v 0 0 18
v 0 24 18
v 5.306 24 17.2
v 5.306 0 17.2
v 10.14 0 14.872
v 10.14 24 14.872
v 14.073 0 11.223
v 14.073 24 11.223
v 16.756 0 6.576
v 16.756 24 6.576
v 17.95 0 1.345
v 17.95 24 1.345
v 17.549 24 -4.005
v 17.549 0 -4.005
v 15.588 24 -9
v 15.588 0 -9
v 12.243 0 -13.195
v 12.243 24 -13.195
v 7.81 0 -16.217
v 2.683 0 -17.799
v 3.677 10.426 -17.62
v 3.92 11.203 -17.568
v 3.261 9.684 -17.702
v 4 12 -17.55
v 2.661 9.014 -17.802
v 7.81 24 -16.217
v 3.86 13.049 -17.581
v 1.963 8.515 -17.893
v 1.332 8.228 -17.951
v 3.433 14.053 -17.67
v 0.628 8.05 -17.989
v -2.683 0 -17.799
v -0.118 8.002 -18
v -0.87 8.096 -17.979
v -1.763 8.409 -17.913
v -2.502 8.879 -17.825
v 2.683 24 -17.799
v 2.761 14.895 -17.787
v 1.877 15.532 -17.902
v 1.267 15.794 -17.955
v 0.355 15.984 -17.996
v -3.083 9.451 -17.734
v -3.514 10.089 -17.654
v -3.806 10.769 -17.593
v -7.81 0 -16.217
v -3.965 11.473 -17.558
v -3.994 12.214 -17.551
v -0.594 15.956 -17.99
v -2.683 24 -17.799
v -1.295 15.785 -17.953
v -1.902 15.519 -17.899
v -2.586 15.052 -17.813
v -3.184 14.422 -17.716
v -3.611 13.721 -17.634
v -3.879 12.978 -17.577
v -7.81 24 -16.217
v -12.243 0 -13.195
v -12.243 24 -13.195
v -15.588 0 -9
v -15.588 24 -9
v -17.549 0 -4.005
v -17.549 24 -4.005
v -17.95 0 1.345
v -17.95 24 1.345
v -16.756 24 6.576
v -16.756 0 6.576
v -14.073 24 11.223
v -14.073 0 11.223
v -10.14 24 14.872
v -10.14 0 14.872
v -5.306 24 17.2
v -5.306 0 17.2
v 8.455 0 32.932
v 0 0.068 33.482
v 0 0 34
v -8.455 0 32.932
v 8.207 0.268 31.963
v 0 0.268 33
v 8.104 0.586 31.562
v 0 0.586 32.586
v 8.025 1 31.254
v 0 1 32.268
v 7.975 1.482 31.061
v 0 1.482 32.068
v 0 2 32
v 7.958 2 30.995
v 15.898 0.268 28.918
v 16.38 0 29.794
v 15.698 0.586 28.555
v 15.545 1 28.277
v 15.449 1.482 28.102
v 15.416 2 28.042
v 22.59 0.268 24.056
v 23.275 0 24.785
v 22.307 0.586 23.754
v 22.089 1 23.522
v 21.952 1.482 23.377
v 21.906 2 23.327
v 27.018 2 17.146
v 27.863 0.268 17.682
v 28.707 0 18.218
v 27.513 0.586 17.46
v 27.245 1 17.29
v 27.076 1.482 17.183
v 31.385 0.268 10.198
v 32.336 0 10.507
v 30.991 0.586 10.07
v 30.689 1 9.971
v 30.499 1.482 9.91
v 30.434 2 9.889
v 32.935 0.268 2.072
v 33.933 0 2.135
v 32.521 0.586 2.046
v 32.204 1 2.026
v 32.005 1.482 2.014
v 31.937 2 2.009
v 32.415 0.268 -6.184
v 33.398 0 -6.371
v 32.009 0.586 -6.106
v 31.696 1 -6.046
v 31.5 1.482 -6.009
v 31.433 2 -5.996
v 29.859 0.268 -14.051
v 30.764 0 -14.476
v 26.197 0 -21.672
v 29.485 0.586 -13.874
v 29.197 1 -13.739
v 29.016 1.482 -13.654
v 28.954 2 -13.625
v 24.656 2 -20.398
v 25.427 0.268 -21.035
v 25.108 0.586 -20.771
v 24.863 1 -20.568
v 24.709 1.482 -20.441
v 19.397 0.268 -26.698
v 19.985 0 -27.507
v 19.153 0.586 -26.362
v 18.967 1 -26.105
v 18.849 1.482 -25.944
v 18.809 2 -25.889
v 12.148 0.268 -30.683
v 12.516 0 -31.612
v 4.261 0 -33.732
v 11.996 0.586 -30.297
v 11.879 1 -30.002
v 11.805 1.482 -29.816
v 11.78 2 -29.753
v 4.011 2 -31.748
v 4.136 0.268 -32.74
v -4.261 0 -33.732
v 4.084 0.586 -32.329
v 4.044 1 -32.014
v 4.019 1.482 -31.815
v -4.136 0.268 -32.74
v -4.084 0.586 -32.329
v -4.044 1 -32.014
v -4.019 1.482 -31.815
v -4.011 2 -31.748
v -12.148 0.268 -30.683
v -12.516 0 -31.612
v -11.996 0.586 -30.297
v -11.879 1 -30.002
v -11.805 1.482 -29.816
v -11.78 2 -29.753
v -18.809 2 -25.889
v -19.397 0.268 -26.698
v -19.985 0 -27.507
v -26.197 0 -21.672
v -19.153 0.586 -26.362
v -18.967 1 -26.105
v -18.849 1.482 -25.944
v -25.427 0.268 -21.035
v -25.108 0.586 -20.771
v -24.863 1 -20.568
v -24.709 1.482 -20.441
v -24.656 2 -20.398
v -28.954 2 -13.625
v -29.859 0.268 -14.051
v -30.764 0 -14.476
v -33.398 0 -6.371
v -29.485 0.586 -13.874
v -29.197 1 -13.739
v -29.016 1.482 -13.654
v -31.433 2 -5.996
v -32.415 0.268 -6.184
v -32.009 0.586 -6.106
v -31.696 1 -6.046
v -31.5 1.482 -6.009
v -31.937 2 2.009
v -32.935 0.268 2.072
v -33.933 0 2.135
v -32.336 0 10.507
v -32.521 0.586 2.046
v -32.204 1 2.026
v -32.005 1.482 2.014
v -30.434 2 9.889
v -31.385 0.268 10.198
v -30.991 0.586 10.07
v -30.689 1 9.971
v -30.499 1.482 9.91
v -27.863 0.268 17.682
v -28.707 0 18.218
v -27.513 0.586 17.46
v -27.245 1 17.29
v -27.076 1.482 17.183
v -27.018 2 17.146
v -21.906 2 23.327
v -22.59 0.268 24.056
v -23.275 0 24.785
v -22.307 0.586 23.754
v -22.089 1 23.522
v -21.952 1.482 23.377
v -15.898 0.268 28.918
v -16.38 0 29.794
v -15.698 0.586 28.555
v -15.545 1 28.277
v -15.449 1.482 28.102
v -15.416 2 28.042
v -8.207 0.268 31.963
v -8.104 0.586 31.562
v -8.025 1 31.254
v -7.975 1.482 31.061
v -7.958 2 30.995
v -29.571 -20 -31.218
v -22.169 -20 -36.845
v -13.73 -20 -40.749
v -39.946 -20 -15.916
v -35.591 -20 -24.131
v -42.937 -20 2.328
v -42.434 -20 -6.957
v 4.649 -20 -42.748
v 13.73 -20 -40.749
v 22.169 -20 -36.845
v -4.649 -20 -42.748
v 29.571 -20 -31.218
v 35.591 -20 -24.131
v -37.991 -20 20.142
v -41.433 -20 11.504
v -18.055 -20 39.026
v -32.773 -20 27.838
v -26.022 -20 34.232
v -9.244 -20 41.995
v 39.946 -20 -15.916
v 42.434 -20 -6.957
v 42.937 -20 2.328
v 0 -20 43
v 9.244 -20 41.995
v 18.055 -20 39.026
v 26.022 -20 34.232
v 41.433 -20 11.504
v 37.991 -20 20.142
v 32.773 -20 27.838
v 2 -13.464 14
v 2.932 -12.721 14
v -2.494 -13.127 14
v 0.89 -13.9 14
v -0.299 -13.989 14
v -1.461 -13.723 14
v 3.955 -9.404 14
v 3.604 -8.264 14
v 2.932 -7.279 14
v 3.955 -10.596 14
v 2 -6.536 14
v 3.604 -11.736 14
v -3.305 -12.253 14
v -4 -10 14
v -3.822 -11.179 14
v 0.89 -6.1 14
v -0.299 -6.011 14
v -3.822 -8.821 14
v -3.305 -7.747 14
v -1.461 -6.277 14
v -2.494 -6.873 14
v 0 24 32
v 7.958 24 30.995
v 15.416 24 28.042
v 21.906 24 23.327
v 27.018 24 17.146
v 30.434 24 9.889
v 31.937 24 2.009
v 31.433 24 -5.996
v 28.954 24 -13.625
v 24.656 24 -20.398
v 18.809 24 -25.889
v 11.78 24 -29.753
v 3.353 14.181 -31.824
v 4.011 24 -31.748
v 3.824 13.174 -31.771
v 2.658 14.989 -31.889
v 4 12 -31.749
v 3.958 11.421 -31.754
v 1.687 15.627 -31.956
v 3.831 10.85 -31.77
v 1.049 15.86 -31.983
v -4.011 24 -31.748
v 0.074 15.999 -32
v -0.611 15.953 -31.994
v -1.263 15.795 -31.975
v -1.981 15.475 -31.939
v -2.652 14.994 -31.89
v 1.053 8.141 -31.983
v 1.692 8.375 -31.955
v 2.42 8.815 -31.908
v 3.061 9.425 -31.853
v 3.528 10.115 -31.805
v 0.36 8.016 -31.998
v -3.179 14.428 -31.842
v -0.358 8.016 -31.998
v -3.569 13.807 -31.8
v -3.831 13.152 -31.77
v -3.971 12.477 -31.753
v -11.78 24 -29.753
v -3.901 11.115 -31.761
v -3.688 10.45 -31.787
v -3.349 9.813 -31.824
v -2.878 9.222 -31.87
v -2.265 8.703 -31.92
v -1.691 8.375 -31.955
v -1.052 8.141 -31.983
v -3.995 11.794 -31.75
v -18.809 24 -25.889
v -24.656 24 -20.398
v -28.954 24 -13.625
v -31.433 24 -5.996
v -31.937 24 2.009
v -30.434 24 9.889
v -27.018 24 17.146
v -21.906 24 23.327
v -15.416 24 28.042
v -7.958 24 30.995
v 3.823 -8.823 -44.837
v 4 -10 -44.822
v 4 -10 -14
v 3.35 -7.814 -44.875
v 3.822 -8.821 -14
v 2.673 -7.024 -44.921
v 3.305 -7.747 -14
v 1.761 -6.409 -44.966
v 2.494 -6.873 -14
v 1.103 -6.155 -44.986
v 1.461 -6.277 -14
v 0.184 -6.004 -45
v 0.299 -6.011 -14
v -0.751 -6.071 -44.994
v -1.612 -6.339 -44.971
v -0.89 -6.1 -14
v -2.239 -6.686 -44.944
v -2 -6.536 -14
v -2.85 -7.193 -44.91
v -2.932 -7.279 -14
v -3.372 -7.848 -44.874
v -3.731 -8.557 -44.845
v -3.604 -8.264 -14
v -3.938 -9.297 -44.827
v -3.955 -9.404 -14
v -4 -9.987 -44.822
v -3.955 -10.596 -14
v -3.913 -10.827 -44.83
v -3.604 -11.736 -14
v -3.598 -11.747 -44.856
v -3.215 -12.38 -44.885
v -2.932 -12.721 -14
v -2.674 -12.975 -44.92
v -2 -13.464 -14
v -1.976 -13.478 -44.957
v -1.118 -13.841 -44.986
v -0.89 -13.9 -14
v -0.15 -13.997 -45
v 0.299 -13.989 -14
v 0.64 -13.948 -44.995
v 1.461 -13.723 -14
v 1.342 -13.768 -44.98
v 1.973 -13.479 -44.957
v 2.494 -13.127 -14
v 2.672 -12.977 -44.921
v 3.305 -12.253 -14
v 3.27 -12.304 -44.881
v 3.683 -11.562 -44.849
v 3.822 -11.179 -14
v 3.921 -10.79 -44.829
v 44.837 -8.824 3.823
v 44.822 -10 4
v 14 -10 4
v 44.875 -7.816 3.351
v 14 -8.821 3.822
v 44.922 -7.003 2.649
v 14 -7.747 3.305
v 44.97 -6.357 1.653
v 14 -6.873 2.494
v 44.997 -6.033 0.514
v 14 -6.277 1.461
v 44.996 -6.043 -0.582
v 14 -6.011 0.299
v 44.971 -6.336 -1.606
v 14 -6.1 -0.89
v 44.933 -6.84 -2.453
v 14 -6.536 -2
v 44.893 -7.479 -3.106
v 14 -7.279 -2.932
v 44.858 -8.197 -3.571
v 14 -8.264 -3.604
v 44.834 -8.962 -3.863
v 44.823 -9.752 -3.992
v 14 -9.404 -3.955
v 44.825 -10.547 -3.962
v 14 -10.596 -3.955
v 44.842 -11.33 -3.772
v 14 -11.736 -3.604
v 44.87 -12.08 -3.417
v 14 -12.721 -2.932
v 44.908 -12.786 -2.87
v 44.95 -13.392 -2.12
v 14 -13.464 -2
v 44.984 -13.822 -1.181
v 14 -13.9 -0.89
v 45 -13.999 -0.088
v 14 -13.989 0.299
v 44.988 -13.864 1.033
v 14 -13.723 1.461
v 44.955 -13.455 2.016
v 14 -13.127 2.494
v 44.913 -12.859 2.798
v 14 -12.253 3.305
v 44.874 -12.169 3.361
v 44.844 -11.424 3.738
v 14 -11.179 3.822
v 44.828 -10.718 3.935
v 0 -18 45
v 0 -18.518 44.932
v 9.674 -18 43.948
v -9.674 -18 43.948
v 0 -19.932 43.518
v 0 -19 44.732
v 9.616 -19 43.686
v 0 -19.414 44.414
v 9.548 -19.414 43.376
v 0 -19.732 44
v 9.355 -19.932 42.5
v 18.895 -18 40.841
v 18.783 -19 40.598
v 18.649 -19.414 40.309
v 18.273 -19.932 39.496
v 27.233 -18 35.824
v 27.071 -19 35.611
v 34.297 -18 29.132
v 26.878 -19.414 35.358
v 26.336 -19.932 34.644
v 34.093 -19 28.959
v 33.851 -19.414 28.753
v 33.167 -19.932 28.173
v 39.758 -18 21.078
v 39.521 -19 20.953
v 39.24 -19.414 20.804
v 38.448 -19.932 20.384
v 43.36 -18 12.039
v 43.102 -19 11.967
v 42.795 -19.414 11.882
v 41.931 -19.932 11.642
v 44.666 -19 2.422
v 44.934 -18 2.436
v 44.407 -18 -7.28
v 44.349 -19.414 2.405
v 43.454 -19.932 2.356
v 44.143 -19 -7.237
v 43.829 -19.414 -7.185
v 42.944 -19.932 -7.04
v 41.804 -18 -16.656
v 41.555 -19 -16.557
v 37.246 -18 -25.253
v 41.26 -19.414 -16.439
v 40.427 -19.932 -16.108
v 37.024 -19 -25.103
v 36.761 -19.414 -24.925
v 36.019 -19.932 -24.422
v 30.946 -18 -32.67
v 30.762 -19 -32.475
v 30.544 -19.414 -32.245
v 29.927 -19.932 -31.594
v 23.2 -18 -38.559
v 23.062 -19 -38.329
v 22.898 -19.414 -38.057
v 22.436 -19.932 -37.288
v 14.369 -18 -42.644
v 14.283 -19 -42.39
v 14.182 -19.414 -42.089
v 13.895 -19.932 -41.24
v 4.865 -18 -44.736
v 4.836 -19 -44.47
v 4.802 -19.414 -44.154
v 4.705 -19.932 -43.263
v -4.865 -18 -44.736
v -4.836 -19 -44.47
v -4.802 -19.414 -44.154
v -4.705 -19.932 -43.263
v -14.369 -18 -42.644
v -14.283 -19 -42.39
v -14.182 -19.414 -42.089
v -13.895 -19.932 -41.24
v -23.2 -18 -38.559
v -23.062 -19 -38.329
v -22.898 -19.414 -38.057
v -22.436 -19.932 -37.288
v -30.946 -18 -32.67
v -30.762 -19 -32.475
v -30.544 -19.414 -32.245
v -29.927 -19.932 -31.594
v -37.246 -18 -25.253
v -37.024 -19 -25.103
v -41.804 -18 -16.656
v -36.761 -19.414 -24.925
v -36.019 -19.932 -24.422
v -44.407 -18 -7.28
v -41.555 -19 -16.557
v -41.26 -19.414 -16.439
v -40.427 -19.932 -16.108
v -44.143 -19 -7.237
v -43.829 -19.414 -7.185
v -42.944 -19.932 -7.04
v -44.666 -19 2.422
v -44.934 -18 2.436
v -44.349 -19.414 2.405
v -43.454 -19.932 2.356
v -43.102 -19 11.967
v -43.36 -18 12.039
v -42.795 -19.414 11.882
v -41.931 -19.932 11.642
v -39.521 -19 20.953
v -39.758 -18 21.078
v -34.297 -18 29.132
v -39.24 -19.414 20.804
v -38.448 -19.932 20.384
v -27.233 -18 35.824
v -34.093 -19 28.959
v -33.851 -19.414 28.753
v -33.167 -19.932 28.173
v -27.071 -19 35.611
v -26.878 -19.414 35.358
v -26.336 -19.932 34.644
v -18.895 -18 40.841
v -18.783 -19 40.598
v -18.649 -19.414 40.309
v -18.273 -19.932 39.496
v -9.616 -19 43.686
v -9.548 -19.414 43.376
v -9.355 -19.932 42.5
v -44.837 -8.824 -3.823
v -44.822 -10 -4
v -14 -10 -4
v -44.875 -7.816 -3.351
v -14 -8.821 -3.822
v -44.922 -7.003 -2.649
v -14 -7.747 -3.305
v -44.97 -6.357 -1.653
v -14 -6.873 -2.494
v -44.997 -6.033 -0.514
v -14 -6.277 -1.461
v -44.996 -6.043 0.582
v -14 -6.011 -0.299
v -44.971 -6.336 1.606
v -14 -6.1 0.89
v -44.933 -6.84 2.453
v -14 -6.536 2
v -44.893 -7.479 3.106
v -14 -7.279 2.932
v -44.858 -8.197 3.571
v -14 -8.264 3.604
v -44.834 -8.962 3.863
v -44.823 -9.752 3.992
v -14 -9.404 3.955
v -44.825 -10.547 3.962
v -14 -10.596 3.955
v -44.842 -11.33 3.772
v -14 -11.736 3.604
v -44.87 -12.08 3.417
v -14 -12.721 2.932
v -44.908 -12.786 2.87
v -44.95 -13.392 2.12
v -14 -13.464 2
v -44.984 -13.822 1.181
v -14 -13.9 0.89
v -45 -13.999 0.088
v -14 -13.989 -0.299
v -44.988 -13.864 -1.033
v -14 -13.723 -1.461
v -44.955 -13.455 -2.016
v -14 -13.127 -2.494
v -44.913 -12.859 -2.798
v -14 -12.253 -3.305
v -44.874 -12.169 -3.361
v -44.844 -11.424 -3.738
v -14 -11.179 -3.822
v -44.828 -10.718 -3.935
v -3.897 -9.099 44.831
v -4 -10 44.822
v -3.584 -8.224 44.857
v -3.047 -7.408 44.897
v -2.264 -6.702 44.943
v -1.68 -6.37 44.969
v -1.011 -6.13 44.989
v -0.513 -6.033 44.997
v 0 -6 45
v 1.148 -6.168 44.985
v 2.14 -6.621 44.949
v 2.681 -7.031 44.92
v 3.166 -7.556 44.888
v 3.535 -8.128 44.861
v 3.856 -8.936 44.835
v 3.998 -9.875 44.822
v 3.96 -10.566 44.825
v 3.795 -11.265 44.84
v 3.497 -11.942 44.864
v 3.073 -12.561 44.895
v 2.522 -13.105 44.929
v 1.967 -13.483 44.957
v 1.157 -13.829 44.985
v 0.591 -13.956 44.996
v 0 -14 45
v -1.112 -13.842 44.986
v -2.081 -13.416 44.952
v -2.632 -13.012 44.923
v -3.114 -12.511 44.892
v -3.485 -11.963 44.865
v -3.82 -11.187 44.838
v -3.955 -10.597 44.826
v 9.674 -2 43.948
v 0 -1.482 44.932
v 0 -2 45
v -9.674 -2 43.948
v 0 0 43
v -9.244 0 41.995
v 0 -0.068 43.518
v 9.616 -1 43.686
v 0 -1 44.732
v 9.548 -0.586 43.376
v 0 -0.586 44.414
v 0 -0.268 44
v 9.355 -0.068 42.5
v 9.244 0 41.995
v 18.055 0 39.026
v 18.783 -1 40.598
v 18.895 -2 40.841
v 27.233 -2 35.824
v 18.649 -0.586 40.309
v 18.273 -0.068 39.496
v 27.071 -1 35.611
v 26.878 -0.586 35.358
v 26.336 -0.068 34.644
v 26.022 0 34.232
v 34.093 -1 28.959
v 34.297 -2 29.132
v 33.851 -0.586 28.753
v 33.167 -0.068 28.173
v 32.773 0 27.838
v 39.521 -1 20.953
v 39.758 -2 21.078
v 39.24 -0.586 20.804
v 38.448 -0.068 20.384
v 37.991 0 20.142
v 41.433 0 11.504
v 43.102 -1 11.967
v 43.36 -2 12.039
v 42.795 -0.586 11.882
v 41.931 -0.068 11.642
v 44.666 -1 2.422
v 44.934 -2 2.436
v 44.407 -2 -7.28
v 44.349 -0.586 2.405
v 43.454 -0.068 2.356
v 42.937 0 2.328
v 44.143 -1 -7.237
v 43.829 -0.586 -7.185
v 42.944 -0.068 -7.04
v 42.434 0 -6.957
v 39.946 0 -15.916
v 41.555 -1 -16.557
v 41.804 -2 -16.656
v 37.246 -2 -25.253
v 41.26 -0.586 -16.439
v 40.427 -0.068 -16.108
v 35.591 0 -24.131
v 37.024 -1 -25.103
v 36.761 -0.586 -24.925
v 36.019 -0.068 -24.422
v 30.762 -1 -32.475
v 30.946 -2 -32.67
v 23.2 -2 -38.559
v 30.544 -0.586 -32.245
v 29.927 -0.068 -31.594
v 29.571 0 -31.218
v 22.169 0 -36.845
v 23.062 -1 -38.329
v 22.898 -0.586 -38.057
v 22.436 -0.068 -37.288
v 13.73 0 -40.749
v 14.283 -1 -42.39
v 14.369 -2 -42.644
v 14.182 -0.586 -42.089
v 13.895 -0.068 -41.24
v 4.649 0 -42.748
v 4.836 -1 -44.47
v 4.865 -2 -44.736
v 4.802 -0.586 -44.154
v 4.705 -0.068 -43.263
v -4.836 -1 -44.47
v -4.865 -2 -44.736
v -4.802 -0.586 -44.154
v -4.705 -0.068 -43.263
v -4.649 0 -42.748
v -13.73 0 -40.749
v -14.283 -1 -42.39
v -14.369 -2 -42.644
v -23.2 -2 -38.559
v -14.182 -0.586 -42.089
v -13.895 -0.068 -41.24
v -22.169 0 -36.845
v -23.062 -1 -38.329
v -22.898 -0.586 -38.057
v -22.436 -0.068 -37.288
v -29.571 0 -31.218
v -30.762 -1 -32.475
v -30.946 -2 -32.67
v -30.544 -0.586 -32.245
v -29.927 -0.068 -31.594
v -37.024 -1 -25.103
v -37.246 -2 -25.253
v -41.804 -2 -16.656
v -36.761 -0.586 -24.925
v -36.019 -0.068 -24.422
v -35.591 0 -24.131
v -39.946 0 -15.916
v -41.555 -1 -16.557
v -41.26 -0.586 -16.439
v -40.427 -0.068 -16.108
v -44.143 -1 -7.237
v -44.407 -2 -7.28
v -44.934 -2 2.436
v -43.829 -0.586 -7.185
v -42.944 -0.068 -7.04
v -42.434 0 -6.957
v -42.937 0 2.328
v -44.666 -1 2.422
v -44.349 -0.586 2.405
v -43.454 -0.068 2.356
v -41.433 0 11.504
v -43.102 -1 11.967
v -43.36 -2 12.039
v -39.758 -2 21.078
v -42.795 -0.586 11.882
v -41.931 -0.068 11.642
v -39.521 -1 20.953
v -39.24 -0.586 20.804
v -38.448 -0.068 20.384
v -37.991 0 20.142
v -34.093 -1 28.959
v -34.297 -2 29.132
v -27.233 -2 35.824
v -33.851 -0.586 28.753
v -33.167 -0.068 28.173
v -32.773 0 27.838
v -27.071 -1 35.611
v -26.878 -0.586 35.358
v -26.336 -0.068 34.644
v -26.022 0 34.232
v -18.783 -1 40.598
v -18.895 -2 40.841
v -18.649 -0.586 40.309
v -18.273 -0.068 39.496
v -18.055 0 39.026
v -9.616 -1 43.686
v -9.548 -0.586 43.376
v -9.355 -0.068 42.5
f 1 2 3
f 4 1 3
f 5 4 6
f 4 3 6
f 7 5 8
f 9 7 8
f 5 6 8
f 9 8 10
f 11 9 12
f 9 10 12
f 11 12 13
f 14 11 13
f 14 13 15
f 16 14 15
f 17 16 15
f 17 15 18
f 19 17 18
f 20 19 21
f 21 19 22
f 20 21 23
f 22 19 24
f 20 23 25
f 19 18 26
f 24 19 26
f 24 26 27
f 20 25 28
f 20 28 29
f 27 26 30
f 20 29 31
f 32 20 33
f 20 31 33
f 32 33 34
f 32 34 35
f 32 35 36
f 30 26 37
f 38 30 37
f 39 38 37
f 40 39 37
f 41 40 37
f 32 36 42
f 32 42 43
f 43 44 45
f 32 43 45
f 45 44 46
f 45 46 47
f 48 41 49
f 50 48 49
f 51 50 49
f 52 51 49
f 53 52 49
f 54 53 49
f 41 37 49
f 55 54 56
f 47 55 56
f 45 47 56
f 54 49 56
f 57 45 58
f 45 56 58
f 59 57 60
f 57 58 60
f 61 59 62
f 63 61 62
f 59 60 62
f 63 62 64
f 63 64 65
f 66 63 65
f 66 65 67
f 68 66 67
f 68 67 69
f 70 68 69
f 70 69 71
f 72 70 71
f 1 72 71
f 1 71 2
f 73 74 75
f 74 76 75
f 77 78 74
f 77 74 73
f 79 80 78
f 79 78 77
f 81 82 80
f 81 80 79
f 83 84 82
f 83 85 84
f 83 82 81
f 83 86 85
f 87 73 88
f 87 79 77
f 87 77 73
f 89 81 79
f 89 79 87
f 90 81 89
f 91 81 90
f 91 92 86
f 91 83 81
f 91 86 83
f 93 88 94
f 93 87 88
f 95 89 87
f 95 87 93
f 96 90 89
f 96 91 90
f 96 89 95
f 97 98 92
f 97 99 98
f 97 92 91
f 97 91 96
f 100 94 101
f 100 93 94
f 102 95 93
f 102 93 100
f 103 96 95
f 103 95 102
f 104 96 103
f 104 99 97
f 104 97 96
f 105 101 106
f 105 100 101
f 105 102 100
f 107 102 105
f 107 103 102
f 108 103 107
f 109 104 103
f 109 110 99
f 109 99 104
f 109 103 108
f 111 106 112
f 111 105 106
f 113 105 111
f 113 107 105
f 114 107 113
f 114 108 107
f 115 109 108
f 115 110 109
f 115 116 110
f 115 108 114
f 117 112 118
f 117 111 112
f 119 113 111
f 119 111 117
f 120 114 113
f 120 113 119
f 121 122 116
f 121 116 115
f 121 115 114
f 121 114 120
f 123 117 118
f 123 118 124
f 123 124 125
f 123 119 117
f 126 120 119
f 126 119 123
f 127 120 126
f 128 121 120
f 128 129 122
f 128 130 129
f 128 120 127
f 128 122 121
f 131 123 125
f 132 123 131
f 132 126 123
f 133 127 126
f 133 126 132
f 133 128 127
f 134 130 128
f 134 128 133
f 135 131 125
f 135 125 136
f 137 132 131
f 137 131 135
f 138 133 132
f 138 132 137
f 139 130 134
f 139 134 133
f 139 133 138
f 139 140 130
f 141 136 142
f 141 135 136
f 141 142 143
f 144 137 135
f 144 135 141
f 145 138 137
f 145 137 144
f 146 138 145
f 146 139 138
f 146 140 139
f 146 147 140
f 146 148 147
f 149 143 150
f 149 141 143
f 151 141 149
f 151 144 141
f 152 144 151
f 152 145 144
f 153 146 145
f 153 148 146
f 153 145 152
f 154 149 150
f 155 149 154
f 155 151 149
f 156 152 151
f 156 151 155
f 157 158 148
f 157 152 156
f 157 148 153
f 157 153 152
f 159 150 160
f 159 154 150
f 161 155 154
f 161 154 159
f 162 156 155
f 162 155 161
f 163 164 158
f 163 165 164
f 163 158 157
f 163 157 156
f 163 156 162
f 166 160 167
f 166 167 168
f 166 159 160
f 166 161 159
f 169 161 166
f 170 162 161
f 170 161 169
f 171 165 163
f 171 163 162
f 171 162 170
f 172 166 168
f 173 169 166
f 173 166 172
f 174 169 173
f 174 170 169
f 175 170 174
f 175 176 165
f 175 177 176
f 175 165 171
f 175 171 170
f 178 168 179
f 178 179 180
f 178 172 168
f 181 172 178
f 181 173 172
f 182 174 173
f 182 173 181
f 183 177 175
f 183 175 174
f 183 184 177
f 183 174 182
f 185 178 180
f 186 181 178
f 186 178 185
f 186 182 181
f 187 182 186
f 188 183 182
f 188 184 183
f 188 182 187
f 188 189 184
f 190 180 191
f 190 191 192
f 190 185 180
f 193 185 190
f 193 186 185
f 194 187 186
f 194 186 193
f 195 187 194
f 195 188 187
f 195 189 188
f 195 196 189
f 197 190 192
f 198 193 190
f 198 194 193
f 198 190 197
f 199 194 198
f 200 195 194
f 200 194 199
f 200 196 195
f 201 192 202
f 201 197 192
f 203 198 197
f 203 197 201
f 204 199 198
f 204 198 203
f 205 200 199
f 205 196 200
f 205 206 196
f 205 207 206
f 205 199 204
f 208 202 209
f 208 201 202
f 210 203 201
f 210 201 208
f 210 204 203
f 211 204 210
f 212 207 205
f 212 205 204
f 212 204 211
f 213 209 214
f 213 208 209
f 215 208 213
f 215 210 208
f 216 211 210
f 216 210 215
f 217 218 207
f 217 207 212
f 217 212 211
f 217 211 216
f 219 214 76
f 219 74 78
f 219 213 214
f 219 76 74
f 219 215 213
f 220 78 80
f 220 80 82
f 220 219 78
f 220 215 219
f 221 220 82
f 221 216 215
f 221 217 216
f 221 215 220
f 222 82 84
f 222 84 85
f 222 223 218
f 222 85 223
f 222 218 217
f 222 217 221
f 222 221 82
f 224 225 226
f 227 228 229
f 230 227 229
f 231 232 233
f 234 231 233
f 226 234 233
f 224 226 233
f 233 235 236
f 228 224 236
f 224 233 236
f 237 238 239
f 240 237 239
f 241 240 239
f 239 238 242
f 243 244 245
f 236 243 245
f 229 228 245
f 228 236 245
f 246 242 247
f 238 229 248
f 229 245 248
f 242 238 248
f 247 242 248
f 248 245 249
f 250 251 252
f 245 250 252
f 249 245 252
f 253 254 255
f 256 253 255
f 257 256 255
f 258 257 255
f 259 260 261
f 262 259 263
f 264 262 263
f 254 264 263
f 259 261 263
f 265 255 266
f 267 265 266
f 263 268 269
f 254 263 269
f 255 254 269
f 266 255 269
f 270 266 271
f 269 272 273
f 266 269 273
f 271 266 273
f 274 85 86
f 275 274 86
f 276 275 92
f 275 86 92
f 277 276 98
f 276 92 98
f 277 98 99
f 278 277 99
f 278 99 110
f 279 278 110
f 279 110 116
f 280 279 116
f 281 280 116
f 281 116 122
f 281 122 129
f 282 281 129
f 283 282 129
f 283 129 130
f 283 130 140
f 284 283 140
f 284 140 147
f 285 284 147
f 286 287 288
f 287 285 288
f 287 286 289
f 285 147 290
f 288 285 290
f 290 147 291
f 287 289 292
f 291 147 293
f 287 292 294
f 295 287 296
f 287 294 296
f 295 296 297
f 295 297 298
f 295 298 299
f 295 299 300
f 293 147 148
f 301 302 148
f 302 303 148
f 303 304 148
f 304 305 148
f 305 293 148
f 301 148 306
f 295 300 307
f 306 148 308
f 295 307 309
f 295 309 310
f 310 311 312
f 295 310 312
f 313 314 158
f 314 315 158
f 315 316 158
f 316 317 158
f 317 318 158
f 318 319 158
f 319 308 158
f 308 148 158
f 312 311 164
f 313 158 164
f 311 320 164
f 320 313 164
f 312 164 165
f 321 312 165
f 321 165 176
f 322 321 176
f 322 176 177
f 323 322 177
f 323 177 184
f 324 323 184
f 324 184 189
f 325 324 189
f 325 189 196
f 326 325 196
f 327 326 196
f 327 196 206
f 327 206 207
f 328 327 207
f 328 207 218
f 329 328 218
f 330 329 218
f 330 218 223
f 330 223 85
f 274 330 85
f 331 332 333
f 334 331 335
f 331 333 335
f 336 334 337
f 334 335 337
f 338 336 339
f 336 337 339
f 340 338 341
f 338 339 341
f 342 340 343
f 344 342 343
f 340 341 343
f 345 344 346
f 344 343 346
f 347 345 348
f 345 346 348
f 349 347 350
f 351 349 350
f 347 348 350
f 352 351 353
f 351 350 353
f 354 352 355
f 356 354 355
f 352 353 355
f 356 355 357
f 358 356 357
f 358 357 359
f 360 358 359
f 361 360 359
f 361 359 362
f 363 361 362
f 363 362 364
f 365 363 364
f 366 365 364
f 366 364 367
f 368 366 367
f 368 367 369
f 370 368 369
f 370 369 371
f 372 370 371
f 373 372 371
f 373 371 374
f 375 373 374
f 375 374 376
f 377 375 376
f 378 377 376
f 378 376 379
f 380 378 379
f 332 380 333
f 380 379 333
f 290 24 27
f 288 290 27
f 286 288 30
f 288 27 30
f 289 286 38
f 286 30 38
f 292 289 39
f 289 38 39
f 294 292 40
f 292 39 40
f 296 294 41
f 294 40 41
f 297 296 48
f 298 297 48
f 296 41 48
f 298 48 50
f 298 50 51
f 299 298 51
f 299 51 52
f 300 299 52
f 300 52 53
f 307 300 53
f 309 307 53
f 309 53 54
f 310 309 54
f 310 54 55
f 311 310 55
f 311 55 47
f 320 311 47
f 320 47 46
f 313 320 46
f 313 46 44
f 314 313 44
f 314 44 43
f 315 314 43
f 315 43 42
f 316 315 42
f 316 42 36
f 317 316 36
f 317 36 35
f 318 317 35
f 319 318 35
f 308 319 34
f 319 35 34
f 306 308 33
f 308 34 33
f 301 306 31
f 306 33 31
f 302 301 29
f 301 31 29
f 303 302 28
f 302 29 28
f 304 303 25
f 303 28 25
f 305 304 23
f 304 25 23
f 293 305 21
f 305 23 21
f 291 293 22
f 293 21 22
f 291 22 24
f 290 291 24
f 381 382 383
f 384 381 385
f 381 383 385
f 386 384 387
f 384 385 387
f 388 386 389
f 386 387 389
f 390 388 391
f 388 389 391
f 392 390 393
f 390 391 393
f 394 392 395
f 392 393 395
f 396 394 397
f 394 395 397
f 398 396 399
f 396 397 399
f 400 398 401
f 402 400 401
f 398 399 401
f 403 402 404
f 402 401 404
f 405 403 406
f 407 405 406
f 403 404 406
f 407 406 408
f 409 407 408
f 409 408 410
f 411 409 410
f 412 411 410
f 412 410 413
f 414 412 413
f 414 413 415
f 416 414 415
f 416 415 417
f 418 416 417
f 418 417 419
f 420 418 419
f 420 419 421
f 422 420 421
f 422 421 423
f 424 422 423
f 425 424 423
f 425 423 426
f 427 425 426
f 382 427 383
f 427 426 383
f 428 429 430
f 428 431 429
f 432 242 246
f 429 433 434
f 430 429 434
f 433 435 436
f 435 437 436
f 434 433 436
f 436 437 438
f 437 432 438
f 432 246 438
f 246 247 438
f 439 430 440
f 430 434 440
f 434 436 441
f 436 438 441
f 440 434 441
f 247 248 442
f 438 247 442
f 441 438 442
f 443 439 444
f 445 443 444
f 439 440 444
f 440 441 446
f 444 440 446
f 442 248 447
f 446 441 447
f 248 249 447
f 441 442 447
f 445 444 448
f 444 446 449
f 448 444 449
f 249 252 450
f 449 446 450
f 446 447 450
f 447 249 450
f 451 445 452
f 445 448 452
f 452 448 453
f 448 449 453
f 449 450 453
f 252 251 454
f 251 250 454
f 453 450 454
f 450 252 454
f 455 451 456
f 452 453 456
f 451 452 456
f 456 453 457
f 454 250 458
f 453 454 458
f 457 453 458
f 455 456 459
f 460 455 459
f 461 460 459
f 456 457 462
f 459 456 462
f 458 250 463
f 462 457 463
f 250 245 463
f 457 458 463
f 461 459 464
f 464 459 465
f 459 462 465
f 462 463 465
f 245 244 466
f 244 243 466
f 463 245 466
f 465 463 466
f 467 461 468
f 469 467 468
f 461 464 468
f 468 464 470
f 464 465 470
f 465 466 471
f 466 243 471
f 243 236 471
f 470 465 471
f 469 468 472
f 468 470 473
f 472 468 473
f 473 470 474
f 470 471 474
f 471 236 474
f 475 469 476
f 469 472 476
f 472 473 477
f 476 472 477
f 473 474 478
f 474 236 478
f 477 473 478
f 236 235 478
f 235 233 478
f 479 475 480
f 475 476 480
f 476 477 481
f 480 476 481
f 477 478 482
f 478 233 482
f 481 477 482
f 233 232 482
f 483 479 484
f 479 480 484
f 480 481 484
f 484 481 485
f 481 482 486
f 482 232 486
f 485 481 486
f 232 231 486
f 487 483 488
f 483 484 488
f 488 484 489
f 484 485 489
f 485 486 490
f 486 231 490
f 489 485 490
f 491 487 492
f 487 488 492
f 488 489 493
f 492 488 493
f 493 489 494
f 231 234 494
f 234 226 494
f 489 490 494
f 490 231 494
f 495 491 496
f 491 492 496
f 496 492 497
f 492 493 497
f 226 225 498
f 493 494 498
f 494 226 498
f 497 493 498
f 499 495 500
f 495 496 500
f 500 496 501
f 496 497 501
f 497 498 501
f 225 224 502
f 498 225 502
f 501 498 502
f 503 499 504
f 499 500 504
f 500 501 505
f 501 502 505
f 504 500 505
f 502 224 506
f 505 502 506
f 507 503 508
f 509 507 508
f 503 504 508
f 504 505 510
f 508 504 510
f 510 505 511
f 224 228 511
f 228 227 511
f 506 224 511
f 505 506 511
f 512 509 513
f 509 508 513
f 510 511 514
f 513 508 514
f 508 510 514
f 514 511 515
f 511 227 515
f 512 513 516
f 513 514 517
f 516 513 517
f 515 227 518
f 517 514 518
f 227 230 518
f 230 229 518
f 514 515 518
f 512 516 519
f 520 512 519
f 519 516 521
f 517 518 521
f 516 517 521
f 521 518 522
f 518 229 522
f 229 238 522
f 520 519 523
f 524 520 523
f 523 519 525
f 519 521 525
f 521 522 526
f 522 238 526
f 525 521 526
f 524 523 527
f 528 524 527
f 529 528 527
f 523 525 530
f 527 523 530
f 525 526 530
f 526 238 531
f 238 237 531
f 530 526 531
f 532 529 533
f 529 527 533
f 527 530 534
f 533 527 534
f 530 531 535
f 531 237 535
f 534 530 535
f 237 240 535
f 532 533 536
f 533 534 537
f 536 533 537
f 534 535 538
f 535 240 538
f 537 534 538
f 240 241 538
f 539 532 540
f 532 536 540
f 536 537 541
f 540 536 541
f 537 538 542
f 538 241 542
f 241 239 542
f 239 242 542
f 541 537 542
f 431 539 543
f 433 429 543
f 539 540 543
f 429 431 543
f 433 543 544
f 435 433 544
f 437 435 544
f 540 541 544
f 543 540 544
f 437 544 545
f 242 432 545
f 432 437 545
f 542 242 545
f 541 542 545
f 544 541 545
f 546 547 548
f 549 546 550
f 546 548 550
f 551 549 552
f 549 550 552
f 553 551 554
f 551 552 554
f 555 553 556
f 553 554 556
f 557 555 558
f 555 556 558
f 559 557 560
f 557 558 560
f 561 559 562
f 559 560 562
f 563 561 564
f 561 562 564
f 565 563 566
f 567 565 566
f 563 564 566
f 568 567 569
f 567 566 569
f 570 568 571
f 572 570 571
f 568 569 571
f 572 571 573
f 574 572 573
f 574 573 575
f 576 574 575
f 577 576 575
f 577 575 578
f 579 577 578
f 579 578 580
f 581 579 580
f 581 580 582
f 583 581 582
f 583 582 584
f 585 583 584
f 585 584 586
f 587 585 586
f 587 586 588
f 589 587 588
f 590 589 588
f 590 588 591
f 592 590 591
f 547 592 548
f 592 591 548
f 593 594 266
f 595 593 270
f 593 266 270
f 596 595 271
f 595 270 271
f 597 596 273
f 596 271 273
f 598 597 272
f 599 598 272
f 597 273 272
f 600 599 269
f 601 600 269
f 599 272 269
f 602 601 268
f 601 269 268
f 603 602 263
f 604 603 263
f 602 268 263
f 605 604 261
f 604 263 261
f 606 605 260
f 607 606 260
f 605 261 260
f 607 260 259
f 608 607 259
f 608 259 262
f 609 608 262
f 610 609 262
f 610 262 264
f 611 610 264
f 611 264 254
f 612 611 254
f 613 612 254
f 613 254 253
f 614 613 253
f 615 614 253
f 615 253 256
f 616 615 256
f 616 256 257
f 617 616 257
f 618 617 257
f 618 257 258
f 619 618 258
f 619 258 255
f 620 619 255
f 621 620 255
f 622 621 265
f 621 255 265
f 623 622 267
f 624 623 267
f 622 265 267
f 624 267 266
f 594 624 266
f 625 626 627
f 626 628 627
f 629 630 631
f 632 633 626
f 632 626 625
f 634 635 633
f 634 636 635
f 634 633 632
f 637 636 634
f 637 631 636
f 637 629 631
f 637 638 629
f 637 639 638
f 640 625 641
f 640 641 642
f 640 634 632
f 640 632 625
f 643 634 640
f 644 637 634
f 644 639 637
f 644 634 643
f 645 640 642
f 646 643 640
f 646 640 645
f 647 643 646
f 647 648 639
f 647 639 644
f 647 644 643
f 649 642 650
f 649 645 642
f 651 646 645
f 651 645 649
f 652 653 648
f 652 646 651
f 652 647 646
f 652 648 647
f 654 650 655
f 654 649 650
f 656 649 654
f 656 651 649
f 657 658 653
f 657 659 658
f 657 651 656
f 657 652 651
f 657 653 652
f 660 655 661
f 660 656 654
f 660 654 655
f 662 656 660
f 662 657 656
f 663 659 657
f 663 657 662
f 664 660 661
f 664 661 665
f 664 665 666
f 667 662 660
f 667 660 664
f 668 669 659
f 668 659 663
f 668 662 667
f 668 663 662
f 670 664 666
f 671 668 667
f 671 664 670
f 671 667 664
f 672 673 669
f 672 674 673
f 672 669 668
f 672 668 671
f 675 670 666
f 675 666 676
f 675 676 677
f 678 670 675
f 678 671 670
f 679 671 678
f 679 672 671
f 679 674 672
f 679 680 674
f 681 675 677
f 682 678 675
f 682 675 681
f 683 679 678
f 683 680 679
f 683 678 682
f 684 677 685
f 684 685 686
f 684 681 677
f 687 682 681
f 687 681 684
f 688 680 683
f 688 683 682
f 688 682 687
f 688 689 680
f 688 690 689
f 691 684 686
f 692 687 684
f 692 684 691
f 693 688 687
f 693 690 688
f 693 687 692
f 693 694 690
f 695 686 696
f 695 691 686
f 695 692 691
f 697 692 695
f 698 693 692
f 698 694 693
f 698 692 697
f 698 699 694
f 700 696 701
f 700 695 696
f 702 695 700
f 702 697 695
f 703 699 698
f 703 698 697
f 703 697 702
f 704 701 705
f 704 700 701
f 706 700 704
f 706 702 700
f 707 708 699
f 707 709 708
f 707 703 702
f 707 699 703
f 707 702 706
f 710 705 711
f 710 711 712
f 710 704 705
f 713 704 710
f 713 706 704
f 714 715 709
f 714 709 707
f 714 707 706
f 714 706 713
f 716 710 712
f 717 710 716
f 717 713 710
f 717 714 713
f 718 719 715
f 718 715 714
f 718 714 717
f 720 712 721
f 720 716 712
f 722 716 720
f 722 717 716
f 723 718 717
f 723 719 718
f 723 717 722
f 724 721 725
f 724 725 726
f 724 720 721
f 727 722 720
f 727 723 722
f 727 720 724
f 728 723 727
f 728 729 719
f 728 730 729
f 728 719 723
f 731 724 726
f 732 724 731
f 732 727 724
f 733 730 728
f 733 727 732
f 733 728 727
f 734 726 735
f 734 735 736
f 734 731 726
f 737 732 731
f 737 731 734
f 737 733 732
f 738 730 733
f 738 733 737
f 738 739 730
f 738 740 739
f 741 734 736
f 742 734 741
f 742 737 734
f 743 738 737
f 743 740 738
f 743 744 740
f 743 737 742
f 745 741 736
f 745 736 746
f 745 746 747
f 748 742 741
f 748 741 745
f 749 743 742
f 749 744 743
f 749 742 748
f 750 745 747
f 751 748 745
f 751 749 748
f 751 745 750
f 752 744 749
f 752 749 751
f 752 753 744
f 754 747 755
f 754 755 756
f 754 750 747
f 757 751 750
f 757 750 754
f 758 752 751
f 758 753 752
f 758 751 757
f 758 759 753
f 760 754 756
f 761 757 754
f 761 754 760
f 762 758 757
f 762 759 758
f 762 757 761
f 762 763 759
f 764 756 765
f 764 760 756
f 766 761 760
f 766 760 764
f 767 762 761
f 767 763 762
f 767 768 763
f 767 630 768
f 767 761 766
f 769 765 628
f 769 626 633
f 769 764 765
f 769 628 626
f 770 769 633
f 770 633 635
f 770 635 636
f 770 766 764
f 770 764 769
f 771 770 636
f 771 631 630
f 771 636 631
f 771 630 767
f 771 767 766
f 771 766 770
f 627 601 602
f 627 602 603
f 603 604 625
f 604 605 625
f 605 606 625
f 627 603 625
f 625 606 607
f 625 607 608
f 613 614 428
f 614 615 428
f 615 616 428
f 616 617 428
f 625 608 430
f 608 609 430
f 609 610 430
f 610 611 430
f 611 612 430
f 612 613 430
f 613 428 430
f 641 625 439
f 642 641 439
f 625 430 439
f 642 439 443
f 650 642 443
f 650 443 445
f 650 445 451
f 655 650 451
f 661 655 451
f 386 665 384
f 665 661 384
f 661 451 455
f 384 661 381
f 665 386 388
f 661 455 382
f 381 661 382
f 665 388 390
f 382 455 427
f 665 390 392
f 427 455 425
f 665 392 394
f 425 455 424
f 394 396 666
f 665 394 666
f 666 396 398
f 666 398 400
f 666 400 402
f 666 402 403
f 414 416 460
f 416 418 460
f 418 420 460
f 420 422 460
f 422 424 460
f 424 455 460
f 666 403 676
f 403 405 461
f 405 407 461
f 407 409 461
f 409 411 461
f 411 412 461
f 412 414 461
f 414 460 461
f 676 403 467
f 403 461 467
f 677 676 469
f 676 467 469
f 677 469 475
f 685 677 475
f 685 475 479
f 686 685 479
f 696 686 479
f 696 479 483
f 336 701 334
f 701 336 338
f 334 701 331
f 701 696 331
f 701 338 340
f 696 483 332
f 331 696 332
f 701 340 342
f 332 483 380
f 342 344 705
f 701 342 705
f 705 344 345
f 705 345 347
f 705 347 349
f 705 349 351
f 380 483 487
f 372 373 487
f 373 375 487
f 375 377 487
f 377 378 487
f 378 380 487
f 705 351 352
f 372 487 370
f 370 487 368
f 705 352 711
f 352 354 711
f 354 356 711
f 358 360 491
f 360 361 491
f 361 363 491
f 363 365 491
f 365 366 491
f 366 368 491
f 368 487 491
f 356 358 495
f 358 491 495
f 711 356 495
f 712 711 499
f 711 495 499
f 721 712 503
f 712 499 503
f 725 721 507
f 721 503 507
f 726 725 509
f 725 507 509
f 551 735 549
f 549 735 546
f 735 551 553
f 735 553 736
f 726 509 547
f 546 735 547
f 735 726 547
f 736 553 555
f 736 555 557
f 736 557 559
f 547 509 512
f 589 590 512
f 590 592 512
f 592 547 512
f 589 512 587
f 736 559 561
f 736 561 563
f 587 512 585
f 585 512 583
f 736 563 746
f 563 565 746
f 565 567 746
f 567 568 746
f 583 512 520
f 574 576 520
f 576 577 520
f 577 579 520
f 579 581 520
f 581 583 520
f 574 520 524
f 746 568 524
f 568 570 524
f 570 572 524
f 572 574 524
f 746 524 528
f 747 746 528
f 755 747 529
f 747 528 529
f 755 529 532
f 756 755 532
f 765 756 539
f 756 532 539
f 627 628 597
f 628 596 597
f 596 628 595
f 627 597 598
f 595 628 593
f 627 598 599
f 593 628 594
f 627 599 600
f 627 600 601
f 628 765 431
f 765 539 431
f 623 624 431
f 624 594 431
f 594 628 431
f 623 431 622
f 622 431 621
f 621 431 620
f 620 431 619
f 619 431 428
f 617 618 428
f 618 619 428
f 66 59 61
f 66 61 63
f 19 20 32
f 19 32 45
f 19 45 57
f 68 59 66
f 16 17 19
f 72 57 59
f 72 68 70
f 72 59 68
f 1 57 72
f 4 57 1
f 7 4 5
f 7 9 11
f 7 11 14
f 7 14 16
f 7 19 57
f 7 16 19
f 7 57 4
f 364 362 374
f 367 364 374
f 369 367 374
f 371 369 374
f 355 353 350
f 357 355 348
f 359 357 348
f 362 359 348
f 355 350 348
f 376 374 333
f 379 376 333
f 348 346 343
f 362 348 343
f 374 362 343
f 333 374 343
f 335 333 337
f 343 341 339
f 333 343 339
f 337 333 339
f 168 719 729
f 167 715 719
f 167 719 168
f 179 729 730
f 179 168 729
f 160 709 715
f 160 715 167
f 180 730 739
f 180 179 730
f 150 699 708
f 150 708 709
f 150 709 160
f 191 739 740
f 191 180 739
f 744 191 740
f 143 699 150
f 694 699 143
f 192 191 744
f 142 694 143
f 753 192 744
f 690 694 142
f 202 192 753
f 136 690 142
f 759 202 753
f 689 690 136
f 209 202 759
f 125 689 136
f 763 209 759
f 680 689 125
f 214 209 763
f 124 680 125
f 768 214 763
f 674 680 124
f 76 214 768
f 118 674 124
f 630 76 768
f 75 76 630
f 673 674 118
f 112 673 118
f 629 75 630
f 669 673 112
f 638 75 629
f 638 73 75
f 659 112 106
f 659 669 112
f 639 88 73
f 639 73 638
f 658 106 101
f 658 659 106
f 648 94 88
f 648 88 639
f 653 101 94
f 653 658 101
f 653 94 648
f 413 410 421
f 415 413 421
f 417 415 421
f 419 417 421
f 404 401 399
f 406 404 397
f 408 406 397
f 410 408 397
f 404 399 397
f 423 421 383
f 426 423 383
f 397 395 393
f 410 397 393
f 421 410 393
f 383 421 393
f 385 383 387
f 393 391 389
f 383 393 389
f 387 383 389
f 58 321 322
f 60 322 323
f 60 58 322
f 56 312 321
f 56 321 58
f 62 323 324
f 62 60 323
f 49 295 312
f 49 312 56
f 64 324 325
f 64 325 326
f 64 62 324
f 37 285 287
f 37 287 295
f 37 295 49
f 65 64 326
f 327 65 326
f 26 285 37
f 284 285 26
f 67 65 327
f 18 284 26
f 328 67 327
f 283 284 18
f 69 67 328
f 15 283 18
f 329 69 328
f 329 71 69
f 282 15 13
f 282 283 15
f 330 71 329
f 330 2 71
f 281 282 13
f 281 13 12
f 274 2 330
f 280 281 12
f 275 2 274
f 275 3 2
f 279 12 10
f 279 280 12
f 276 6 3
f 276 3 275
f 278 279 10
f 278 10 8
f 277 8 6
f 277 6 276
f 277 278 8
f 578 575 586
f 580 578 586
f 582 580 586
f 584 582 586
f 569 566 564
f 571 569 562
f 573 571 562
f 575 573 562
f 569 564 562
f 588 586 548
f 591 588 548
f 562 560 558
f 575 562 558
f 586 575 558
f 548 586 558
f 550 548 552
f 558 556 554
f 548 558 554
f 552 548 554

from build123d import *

# Parameters (mm, degrees)
SKETCH1_R           = 32
BOSS_EXTRUDE1_DEPTH = 24
BOSS_EXTRUDE2_START = -20
SKETCH1_4_R         = 45
SKETCH1_4_R_2       = 32
BOSS_EXTRUDE2_DEPTH = 20
SKETCH2_R           = 18
CUT_EXTRUDE1_DEPTH  = 24
CUT_EXTRUDE2_START  = -14
SKETCH3_R           = 4
CUT_EXTRUDE2_DEPTH  = 55.014704293
CIRPATTERN1_COUNT   = 4
SKETCH4_R           = 4
CUT_EXTRUDE3_DEPTH  = 69.014704425
FILLET1_R           = 2


with BuildPart() as part:
    # Sketch1 → Boss-Extrude1 (new body)
    with BuildSketch(Plane(origin=(0, 0, 0), x_dir=(1, 0, 0), z_dir=(0, 1, 0))):
        with Locations(Location((0, 0, 0), (0, 0, 270))):
            Circle(SKETCH1_R)
    extrude(amount=BOSS_EXTRUDE1_DEPTH)

    # Sketch1<4> → Boss-Extrude2 (add)
    # profile 1 of 2: a face of its own
    with BuildSketch(Plane(origin=(0, 0, 0), x_dir=(1, 0, 0), z_dir=(0, 1, 0)).offset(BOSS_EXTRUDE2_START)):
        with Locations(Location((0, 0, 0), (0, 0, 270))):
            Circle(SKETCH1_4_R)
        with Locations(Location((0, 0, 0), (0, 0, 270))):
            Circle(SKETCH1_4_R_2, mode=Mode.SUBTRACT)
    # profile 2 of 2: a face of its own
    with BuildSketch(Plane(origin=(0, 0, 0), x_dir=(1, 0, 0), z_dir=(0, 1, 0)).offset(BOSS_EXTRUDE2_START)):
        with Locations(Location((0, 0, 0), (0, 0, 270))):
            Circle(SKETCH1_4_R_2)
    extrude(amount=BOSS_EXTRUDE2_DEPTH)

    # Sketch2 → Cut-Extrude1 (cut)
    with BuildSketch(Plane(origin=(0, 24, 0), x_dir=(1, 0, 0), z_dir=(0, 1, 0))):
        with Locations(Location((0, 0, 0), (0, 0, 270))):
            Circle(SKETCH2_R)
    extrude(amount=-CUT_EXTRUDE1_DEPTH, mode=Mode.SUBTRACT)

    # Sketch3 → Cut-Extrude2 (cut, through all)
    with BuildSketch(Plane.XY.offset(CUT_EXTRUDE2_START)):
        with Locations((0, -10)):
            Circle(SKETCH3_R)
    cut_extrude2 = extrude(amount=-CUT_EXTRUDE2_DEPTH, mode=Mode.SUBTRACT)

    # CirPattern1: Cut-Extrude2 ×4 about axis
    cirpattern1_axis = Axis((0, 0, 0), (0, 1, 0))
    for i in range(1, CIRPATTERN1_COUNT):
        add(cut_extrude2.rotate(cirpattern1_axis, i * 360 / CIRPATTERN1_COUNT), mode=Mode.SUBTRACT)

    # Sketch4 → Cut-Extrude3 (cut, through all)
    with BuildSketch(Plane.XY):
        with Locations((0, 12)):
            Circle(SKETCH4_R)
    extrude(amount=-CUT_EXTRUDE3_DEPTH, mode=Mode.SUBTRACT)

    # Fillet1
    fillet1_edges = [part.edges().sort_by_distance(p)[0] for p in [
        (0, 0, -32),
        (0, -20, -45),
        (0, 0, -45),
    ]]
    fillet(fillet1_edges, radius=FILLET1_R)


solid = part.part
